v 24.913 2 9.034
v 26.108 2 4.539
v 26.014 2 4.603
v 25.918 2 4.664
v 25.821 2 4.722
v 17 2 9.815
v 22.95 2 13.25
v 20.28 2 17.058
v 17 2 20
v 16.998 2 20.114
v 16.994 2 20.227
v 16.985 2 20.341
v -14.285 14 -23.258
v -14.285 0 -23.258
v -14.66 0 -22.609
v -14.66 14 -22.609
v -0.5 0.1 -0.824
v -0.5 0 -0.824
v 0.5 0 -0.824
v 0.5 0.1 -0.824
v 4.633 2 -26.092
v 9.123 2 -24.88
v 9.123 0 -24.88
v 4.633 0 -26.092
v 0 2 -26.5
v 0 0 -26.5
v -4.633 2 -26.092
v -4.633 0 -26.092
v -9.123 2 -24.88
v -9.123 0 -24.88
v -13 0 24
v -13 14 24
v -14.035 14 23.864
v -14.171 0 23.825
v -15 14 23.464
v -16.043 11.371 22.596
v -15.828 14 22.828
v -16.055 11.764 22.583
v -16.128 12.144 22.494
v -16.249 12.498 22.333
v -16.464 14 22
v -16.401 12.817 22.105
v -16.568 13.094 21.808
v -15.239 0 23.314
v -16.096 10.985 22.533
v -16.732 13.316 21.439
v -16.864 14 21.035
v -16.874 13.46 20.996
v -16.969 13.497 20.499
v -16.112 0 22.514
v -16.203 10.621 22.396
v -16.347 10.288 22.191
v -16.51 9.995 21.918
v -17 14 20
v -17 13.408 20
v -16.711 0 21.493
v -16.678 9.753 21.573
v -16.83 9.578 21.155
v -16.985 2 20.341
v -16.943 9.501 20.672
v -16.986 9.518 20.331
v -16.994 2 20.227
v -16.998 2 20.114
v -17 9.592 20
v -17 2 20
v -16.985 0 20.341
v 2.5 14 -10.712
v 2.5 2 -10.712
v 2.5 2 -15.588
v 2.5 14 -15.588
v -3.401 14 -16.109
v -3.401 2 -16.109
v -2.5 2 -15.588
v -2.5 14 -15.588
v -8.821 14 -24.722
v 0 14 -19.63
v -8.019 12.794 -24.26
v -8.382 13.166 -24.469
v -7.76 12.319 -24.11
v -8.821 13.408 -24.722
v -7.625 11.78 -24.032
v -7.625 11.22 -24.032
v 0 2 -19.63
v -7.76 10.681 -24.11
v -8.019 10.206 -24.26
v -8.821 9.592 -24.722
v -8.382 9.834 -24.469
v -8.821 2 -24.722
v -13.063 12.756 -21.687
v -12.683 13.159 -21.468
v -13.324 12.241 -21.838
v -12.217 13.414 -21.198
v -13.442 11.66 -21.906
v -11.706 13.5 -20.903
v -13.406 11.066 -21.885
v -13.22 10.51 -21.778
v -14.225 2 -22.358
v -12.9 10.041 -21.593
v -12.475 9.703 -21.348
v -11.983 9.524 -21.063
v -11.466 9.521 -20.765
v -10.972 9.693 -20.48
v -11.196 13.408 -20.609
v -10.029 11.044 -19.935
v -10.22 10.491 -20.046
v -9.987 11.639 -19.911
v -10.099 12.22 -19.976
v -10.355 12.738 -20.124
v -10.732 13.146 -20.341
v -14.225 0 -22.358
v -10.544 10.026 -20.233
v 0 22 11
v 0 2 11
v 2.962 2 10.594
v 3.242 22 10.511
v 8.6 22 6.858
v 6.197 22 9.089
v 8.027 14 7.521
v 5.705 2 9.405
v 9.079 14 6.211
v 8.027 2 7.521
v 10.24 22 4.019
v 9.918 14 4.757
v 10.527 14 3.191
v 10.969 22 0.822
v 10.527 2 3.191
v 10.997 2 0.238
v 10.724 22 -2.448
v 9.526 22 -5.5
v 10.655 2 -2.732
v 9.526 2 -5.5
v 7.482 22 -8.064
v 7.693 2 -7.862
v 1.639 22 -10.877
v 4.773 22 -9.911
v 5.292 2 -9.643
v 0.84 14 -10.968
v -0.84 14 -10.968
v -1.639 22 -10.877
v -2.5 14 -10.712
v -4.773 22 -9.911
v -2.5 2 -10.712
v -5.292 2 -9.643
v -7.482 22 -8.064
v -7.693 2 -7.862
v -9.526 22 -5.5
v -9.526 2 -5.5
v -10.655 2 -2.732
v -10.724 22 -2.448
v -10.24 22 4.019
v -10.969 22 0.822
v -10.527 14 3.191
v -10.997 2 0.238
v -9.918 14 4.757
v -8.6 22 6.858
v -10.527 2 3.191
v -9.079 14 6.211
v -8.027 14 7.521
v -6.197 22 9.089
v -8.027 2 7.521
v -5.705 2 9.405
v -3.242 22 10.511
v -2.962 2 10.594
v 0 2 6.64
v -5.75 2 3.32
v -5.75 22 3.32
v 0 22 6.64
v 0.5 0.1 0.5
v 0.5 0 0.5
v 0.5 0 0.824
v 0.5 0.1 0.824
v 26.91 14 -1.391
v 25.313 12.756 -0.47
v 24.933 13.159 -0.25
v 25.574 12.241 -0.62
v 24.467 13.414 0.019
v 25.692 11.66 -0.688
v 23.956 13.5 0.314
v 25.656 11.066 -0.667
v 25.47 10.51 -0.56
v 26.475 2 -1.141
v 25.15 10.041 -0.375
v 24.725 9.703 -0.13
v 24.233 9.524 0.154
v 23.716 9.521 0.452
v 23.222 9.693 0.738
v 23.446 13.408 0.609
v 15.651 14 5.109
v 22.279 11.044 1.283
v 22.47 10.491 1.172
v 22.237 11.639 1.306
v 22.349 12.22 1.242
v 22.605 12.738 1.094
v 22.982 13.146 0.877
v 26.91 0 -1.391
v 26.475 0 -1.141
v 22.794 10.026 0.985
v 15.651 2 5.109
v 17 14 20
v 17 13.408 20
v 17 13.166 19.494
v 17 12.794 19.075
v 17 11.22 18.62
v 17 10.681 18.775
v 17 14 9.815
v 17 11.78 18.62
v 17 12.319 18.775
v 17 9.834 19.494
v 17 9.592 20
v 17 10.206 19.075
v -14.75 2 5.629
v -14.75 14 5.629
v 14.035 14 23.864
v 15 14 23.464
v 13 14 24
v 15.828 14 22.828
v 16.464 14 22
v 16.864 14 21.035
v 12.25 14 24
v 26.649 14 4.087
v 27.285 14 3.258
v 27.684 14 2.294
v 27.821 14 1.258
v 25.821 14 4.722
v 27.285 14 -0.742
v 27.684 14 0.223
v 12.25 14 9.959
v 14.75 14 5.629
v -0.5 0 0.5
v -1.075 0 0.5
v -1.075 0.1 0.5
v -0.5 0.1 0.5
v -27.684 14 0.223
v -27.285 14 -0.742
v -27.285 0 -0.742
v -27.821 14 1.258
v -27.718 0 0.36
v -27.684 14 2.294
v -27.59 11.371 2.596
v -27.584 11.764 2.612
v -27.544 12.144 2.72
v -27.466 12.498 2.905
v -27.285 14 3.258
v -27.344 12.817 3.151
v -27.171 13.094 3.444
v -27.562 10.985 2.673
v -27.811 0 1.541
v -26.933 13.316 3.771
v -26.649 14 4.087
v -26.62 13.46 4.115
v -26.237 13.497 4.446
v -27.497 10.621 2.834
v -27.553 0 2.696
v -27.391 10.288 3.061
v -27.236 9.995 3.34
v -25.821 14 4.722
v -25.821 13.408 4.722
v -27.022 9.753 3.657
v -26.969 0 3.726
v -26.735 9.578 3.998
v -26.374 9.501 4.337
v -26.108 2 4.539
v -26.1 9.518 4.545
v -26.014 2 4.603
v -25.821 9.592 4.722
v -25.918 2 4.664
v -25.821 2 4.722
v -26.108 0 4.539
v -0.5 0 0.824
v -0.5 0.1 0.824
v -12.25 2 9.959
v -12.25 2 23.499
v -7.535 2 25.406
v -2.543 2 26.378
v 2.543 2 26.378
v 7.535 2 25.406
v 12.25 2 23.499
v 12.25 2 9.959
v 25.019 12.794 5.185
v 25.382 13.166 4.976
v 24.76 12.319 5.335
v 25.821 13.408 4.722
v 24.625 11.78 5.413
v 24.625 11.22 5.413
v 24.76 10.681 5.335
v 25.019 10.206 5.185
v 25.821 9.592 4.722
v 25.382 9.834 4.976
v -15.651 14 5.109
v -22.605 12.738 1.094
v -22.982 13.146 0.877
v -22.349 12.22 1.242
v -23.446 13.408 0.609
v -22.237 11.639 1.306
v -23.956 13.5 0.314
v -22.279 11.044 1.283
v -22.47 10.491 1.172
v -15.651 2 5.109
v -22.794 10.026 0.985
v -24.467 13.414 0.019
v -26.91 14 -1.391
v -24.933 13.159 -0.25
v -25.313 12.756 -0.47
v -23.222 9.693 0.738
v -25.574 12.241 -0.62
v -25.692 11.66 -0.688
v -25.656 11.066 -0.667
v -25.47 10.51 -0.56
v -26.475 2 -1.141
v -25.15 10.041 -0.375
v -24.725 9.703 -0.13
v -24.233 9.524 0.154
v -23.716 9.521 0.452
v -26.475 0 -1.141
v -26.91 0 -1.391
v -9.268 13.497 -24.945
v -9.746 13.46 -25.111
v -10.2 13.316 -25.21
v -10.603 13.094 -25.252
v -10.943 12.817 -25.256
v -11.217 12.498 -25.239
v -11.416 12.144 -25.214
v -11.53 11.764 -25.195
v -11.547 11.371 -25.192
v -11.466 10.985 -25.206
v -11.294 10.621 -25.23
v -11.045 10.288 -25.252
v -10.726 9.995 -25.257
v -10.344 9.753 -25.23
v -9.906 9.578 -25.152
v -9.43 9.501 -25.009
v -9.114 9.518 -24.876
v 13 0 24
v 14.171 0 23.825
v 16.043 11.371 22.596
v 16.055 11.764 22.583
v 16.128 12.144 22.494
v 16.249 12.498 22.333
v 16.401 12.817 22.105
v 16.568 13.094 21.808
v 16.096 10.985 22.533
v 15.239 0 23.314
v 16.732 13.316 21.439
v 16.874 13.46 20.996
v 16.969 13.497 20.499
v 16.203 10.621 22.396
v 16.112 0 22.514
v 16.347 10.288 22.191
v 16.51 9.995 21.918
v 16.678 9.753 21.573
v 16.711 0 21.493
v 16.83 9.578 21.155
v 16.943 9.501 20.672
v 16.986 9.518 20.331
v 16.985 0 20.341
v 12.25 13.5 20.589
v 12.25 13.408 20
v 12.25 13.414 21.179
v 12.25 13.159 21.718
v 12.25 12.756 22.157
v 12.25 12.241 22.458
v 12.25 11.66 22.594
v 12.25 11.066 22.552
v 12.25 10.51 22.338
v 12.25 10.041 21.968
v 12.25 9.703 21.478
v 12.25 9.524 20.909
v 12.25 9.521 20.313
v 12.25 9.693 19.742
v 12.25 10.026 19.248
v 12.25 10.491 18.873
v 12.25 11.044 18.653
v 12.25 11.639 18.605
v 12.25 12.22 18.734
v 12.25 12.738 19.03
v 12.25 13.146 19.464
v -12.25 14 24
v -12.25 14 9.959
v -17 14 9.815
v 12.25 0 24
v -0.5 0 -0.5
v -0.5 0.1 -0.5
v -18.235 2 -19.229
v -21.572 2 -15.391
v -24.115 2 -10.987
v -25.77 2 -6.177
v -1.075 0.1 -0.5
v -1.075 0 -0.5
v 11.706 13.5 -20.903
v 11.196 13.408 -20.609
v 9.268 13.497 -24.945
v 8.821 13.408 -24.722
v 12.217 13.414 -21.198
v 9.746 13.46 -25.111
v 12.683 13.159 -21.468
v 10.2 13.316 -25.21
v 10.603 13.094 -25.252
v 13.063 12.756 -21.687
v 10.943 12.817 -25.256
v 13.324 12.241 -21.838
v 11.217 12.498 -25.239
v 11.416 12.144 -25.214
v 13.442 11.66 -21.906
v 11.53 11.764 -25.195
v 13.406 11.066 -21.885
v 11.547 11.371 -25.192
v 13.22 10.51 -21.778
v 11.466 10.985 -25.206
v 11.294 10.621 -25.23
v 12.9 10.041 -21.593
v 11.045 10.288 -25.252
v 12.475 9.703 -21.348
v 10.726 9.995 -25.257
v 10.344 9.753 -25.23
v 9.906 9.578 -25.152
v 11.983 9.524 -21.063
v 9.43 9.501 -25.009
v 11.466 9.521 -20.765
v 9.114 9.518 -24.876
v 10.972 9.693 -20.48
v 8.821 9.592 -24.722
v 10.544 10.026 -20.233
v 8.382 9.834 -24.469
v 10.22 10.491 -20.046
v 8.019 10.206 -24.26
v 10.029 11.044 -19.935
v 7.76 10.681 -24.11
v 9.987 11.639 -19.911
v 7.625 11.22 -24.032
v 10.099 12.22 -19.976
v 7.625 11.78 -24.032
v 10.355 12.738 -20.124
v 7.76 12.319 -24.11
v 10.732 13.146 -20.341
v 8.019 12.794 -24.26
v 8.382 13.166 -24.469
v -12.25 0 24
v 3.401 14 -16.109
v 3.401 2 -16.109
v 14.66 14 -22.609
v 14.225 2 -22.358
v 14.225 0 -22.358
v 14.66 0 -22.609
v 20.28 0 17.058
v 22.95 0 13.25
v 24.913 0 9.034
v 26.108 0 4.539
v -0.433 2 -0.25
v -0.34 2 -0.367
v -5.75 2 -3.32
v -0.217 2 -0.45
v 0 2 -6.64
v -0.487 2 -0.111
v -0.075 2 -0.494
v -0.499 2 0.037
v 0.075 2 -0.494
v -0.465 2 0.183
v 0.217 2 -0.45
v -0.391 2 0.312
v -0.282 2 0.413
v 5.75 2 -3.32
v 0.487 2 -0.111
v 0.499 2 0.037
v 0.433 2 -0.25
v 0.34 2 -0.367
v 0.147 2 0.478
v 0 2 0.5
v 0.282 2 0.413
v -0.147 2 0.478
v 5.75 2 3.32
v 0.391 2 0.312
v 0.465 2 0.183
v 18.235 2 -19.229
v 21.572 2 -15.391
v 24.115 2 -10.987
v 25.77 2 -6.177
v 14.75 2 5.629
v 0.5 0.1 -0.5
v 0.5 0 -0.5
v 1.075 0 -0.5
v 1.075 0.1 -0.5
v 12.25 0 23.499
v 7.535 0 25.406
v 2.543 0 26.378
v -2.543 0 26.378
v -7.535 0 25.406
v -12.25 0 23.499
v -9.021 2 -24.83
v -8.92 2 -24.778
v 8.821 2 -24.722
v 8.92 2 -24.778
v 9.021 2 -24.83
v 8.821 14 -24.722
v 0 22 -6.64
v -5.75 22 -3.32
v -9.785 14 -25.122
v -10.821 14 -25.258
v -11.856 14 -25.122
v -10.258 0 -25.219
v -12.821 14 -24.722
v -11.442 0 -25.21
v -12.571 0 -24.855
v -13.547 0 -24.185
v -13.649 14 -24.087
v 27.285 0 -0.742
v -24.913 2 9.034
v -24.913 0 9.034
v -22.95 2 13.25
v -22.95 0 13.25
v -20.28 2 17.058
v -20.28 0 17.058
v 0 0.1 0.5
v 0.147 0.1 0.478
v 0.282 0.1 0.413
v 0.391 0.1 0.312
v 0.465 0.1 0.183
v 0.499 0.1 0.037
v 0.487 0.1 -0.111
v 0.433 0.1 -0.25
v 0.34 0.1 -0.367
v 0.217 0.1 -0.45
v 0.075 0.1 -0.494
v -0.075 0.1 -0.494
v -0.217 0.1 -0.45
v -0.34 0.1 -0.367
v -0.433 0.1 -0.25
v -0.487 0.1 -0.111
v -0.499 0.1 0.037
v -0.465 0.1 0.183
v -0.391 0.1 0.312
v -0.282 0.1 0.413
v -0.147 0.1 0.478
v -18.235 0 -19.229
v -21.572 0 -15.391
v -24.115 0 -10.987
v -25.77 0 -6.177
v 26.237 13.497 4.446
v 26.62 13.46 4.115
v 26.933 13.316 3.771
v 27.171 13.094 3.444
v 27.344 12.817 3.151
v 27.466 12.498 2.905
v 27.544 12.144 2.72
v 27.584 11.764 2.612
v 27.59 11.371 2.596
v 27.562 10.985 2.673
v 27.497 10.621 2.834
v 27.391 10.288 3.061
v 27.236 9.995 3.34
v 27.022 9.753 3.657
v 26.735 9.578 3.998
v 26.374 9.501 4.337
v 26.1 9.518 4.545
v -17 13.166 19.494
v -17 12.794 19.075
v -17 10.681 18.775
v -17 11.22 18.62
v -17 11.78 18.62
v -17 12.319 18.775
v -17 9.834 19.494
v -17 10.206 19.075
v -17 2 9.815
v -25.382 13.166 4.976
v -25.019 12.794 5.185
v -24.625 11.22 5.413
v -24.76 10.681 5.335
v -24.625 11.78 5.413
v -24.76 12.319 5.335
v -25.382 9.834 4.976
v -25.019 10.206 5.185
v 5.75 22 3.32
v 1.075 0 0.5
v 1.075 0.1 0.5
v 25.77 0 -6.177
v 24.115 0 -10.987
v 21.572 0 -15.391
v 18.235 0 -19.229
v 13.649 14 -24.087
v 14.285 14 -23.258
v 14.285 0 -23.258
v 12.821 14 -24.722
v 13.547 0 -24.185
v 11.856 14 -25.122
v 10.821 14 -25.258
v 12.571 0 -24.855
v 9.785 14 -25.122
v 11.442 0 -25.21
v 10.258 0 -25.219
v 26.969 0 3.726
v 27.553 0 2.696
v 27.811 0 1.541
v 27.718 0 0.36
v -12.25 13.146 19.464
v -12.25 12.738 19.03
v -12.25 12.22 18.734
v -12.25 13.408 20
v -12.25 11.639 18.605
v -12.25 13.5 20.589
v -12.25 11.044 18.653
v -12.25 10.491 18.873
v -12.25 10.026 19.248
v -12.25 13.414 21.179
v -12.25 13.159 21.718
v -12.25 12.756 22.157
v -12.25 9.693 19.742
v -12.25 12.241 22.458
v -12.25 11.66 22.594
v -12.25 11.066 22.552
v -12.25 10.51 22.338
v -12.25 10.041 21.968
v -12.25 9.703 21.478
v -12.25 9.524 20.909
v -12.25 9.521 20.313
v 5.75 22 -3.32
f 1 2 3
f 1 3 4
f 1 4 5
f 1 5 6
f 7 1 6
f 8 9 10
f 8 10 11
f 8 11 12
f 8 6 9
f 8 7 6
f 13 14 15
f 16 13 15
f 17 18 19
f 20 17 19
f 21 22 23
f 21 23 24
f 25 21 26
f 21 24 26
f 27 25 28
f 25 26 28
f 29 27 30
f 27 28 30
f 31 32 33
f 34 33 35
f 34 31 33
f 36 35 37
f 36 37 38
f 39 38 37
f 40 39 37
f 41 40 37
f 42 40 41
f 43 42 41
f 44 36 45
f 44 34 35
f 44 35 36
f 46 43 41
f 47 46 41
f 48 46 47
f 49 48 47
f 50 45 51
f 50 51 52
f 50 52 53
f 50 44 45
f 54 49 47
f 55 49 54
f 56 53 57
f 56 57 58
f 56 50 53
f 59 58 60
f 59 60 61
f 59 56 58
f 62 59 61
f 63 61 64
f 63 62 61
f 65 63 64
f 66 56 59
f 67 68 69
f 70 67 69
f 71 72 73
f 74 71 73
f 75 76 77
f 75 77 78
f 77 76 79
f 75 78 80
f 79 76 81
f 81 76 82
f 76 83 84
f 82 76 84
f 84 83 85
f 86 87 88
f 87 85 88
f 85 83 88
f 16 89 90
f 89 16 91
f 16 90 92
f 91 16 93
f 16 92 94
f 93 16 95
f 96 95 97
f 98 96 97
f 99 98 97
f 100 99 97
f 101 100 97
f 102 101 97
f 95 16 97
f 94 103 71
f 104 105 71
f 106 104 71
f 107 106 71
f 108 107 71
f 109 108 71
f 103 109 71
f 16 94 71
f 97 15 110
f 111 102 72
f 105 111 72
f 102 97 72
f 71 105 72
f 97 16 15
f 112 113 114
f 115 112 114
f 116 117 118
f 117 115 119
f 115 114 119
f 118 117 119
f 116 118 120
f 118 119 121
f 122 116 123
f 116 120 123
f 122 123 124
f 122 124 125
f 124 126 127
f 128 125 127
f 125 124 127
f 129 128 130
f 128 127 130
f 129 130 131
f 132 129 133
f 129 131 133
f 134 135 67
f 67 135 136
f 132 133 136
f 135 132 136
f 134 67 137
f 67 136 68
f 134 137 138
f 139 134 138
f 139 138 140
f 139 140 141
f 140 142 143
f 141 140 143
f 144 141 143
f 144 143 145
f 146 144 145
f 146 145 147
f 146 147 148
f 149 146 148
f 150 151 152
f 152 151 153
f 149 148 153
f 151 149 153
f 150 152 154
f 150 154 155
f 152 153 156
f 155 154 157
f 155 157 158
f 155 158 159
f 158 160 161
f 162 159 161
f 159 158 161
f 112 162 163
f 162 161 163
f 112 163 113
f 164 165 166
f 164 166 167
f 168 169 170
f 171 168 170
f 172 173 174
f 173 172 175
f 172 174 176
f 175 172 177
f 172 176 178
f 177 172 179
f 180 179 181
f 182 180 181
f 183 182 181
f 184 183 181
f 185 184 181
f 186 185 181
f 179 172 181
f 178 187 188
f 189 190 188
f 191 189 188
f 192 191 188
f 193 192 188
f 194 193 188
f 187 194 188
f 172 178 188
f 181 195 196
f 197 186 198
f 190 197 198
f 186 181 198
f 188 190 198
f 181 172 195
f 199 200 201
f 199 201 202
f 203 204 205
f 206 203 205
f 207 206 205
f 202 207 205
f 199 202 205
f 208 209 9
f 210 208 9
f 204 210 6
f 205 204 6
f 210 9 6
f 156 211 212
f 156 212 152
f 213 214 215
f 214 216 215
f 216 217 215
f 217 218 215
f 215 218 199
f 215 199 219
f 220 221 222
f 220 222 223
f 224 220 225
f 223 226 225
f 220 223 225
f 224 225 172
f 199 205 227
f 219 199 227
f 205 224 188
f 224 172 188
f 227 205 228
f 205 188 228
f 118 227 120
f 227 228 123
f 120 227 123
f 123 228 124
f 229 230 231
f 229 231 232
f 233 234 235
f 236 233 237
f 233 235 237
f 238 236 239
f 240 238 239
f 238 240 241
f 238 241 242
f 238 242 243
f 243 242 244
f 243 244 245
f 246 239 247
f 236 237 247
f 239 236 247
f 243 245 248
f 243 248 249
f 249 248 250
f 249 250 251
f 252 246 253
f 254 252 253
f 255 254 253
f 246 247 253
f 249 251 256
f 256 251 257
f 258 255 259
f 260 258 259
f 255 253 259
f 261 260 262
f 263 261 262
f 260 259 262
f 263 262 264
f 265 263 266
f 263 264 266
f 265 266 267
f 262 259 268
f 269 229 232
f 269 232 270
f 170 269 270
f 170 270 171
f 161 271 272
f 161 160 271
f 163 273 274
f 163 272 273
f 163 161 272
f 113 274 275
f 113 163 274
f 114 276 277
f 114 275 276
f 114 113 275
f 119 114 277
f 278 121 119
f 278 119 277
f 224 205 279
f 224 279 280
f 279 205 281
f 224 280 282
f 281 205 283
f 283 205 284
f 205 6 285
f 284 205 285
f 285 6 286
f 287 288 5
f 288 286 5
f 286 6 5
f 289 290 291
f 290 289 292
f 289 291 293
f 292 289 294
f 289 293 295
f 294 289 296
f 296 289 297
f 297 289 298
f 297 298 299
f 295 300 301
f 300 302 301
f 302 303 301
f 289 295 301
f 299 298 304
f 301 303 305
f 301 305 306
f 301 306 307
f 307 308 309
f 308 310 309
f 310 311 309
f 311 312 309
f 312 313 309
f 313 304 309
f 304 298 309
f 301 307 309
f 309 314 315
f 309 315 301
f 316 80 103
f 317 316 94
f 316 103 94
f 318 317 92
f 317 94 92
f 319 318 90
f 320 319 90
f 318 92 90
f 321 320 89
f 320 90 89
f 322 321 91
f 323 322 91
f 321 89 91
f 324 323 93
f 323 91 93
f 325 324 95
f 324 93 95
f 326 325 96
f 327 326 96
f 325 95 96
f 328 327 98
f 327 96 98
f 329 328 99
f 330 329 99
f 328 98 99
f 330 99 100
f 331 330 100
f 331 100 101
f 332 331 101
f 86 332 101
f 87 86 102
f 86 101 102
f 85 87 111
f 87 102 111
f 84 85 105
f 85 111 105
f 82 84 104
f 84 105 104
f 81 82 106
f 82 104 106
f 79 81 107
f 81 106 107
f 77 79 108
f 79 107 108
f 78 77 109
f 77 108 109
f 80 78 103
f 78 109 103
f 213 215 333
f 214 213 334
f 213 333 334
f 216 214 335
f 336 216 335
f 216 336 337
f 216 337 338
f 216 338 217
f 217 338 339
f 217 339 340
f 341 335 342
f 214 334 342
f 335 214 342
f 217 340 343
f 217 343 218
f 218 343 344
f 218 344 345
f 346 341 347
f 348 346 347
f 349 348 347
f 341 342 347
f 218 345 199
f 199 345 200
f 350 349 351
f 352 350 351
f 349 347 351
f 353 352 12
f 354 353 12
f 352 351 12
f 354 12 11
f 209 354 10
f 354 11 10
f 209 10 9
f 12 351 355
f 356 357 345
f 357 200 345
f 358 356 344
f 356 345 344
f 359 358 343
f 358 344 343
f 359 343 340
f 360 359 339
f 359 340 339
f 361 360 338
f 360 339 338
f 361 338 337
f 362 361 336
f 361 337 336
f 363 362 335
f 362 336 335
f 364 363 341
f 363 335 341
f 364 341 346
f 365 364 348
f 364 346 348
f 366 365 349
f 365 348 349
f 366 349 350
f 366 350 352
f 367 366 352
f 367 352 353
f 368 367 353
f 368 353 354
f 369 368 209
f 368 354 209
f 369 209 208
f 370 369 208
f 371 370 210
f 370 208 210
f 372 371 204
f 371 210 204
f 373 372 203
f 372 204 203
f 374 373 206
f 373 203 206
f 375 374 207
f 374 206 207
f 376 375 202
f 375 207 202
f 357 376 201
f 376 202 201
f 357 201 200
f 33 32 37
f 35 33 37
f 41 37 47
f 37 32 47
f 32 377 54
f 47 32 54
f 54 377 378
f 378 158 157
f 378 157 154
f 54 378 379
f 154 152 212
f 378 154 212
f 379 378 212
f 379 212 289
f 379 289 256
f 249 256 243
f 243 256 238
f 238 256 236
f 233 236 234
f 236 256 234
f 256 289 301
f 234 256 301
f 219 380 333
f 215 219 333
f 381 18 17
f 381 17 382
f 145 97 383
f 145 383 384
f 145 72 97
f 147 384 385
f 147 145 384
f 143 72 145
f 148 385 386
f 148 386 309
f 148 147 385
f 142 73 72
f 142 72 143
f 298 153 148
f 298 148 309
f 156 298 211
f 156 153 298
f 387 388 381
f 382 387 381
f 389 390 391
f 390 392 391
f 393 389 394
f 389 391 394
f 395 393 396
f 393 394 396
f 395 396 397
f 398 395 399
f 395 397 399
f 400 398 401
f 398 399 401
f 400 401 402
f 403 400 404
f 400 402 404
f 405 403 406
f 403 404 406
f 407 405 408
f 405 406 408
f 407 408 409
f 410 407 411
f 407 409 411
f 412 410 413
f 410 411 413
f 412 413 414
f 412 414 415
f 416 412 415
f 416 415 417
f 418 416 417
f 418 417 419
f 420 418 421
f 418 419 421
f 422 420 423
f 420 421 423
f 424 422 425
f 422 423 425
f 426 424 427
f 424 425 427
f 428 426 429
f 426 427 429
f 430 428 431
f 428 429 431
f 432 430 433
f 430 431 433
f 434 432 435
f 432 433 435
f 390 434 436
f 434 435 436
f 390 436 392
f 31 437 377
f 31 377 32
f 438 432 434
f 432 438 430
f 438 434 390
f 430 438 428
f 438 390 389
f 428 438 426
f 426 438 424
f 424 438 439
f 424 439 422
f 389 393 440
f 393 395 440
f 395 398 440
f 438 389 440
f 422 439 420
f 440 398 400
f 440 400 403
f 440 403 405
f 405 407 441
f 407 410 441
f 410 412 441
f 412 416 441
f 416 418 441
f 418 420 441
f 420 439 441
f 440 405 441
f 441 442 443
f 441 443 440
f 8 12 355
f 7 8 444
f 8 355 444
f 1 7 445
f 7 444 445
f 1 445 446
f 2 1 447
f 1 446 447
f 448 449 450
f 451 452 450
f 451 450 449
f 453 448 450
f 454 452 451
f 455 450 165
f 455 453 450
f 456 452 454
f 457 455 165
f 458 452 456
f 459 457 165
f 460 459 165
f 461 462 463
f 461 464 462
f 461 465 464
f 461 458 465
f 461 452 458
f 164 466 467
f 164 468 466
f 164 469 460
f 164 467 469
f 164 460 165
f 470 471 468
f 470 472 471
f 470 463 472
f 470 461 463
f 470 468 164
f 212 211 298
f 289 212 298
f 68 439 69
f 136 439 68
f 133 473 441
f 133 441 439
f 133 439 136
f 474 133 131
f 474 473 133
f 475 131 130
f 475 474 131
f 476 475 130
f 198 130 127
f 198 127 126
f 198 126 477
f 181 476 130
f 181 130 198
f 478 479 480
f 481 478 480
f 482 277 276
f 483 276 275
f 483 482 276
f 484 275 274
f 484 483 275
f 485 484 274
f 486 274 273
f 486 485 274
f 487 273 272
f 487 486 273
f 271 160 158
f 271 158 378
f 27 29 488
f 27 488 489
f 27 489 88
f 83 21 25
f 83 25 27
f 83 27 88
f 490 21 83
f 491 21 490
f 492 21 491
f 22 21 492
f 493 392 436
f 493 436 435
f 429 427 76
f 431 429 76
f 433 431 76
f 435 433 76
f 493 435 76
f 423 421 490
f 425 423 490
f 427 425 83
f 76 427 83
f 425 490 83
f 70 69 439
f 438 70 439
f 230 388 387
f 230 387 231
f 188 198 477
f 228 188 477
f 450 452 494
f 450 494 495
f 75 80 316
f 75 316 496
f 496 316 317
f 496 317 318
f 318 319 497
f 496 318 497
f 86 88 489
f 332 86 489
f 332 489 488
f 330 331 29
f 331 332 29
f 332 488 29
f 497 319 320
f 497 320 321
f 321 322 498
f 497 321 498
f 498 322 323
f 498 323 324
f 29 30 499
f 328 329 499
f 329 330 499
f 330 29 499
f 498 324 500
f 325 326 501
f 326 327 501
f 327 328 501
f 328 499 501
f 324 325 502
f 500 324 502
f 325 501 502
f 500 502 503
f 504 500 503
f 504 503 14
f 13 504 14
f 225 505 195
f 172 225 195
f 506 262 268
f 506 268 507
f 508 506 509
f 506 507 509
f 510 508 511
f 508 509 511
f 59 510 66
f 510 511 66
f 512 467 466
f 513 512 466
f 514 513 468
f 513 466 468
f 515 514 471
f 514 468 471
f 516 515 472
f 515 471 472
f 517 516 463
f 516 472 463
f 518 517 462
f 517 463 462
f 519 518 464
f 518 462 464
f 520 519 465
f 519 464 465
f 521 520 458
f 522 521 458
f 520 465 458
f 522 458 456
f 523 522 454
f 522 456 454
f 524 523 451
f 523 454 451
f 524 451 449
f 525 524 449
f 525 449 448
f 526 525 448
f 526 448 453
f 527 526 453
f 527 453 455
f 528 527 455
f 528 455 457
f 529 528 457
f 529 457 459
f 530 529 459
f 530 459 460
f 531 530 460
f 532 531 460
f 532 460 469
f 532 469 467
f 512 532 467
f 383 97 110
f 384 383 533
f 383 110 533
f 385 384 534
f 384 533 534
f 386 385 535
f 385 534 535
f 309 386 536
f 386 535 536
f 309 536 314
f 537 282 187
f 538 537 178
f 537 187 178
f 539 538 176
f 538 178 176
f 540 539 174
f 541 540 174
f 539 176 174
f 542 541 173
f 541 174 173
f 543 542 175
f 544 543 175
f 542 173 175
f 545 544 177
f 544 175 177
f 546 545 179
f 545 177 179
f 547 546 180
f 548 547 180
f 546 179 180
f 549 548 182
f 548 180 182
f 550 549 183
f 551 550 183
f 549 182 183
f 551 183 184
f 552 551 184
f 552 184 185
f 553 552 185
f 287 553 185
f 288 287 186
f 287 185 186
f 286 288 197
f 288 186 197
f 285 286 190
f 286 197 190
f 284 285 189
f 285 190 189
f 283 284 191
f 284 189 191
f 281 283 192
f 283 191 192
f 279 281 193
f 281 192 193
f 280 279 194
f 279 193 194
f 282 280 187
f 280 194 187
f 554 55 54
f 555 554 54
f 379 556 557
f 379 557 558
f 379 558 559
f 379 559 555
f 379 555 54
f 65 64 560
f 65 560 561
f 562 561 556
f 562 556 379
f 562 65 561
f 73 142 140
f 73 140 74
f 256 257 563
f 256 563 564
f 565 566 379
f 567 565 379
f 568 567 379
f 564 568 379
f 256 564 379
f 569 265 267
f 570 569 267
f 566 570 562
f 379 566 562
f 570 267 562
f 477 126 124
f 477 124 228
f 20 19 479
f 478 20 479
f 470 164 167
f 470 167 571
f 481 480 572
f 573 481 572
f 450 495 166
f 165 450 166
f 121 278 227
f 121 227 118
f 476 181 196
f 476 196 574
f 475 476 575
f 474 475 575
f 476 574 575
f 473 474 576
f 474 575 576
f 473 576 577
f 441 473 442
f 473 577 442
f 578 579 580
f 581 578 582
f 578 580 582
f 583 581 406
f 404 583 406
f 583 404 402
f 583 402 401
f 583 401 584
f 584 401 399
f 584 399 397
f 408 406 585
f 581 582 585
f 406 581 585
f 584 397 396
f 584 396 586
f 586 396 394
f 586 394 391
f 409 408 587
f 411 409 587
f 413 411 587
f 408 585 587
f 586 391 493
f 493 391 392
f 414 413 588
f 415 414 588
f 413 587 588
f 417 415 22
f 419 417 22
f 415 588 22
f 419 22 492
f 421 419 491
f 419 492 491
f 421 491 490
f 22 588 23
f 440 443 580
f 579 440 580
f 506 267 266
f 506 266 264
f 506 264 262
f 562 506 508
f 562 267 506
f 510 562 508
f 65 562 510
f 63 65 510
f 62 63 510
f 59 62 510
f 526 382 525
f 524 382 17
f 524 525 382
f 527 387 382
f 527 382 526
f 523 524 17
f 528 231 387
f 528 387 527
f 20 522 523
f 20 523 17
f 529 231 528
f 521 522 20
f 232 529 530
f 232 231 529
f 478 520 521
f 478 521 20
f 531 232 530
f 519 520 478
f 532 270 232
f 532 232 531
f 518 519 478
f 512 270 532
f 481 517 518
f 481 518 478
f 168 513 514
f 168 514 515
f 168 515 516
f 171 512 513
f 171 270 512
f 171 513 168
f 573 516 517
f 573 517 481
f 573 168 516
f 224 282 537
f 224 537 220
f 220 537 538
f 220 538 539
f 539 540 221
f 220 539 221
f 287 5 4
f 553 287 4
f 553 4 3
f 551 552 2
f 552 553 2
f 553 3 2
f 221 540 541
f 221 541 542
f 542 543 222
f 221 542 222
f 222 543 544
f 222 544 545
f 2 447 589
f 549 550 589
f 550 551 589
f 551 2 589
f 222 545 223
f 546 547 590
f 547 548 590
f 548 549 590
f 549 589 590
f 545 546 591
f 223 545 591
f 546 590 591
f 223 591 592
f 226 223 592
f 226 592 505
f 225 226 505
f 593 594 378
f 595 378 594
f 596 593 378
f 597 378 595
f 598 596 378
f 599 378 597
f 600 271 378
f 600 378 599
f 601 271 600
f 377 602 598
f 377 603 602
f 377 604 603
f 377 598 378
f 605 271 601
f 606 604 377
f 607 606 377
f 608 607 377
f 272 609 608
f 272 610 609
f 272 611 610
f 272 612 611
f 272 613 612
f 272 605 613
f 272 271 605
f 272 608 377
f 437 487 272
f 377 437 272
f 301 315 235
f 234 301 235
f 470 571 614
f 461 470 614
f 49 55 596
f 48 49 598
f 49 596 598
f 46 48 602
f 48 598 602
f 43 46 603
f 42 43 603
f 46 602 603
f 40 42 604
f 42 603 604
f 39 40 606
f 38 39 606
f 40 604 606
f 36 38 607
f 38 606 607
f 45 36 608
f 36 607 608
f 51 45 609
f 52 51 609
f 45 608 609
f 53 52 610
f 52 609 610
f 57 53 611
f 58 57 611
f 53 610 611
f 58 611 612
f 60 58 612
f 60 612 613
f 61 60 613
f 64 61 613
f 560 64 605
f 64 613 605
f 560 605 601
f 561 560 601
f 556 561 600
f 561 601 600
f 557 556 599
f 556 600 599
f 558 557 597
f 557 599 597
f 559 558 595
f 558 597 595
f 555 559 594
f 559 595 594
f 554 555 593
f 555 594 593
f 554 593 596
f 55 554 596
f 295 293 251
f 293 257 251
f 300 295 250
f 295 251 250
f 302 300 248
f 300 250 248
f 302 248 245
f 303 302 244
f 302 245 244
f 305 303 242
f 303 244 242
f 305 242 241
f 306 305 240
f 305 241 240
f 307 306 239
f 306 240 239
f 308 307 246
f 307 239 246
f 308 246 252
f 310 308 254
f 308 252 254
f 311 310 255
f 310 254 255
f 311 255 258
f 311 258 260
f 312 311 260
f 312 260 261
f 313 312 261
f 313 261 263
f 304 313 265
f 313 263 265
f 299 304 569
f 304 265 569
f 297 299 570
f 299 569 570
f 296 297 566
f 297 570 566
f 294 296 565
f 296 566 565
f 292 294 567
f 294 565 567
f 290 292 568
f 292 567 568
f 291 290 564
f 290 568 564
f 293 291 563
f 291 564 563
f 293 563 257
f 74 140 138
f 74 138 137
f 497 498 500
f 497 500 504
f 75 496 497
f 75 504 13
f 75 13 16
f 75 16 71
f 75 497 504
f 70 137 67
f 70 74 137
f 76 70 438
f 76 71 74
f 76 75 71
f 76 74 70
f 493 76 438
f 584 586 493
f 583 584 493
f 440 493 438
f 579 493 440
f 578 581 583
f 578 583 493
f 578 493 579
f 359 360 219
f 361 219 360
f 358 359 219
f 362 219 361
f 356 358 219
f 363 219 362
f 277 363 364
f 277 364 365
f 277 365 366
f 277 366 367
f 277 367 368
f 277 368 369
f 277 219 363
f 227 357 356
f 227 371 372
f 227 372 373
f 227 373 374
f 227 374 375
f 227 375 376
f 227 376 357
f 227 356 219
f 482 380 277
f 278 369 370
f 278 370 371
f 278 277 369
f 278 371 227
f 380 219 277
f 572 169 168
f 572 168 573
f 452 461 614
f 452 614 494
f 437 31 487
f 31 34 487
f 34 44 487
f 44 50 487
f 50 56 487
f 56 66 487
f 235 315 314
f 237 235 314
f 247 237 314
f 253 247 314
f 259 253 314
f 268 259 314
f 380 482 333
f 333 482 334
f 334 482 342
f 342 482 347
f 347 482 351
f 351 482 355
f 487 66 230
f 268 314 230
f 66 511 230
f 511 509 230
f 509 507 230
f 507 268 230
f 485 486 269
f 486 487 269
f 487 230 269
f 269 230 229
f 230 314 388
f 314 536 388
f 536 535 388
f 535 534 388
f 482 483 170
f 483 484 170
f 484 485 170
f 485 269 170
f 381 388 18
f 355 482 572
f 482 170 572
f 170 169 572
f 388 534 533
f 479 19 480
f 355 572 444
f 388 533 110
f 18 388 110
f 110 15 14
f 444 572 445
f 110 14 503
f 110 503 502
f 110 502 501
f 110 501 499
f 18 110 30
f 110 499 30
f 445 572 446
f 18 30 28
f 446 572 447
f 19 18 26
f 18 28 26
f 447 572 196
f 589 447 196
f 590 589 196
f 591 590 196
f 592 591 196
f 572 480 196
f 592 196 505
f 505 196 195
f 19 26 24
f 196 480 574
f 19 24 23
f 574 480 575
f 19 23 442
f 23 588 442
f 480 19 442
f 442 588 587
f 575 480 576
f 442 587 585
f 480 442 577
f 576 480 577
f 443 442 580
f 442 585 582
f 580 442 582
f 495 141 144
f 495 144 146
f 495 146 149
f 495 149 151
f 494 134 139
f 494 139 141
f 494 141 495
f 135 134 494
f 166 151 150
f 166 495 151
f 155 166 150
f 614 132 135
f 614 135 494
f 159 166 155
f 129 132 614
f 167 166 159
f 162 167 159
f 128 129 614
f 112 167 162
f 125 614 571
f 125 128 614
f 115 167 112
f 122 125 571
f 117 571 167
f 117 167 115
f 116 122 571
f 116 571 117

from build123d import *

# Parameters (mm, degrees)
SALIENTE_EXTRUIR1_DEPTH      = 2
SALIENTE_EXTRUIR1_DEPTH_BACK = 2
CROQUIS2_R                   = 26.5
SALIENTE_EXTRUIR2_DEPTH      = 22
SALIENTE_EXTRUIR2_DEPTH_BACK = 22
CROQUIS3_R                   = 11
CROQUIS5_W                   = 5
CROQUIS5_H                   = 10.605029608
SALIENTE_EXTRUIR3_DEPTH      = 14
SALIENTE_EXTRUIR5_DEPTH      = 14
CROQUIS7_W                   = 24.5
CROQUIS7_H                   = 19
SALIENTE_EXTRUIR12_DEPTH     = 21
CROQUIS8_R                   = 2
CORTAR_EXTRUIR1_DEPTH        = 37
CROQUIS10_W                  = 24.5
CROQUIS10_H                  = 19
CORTAR_EXTRUIR2_DEPTH        = 19
MATRIZC2_COUNT               = 3
CORTAR_EXTRUIR3_START        = -19
CORTAR_EXTRUIR3_DEPTH        = 19
CORTAR_EXTRUIR5_DEPTH        = 33
CORTAR_EXTRUIR5_DEPTH_BACK   = 33
CROQUIS15_W                  = 59.132564764
CROQUIS15_H                  = 24.236023023
CROQUIS16_R                  = 0.5
CORTAR_EXTRUIR6_DEPTH        = 10
CORTAR_EXTRUIR8_START        = -0.1
CROQUIS17_R                  = 0.5
CORTAR_EXTRUIR8_DEPTH        = 0.1


with BuildPart() as part:
    # Croquis2 → Saliente-Extruir1 (new, two sides: drawn at the far end of the back side and taken through both)
    with BuildSketch(Plane(origin=(0, 0, 0), x_dir=(1, 0, 0), z_dir=(0, 1, 0)).offset(-SALIENTE_EXTRUIR1_DEPTH_BACK)):
        Circle(CROQUIS2_R)
    extrude(amount=SALIENTE_EXTRUIR1_DEPTH + SALIENTE_EXTRUIR1_DEPTH_BACK)

    # Croquis3 → Saliente-Extruir2 (add, two sides: drawn at the far end of the back side and taken through both)
    with BuildSketch(Plane(origin=(0, 0, 0), x_dir=(1, 0, 0), z_dir=(0, 1, 0)).offset(-SALIENTE_EXTRUIR2_DEPTH_BACK)):
        Circle(CROQUIS3_R)
        Polygon((0, 6.639528096), (-5.75, 3.319764048), (-5.75, -3.319764048), (0, -6.639528096), (5.75, -3.319764048), (5.75, 3.319764048), align=None, mode=Mode.SUBTRACT)
    extrude(amount=SALIENTE_EXTRUIR2_DEPTH + SALIENTE_EXTRUIR2_DEPTH_BACK)

    # Croquis5 → Saliente-Extruir3 (add)
    with BuildSketch(Plane(origin=(0, 0, 0), x_dir=(1, 0, 0), z_dir=(0, 1, 0))):
        with Locations((0, 13.697485196)):
            Rectangle(CROQUIS5_W, CROQUIS5_H)
        Polygon((8.520257623, -2.032421687), (17.704482672, -7.334936491), (15.204482672, -11.665063509), (6.020257623, -6.362548705), align=None)
        Polygon((-6.020257623, -6.362548705), (-15.204482672, -11.665063509), (-17.704482672, -7.334936491), (-8.520257623, -2.032421687), align=None)
    extrude(amount=SALIENTE_EXTRUIR3_DEPTH)

    # Croquis6 → Saliente-Extruir5 (add)
    with BuildSketch(Plane(origin=(0, 0, 0), x_dir=(1, 0, 0), z_dir=(0, 1, 0))):
        with BuildLine():
            Line((-12.25, -11), (-12.25, -24))
            Line((-12.25, -24), (-13, -24))
            ThreePointArc((-13, -24), (-15.828427125, -22.828427125), (-17, -20))
            Line((-17, -20), (-17, -9))
            Line((-17, -9), (-12.25, -9))
            Line((-12.25, -9), (-12.25, -11))
        make_face()
        with BuildLine():
            Line((12.25, -11), (12.25, -24))
            Line((12.25, -24), (13, -24))
            ThreePointArc((13, -24), (15.828427125, -22.828427125), (17, -20))
            Line((17, -20), (17, -9))
            Line((17, -9), (12.25, -9))
            Line((12.25, -9), (12.25, -11))
        make_face()
        with BuildLine():
            Line((-1.669228634, 15.108811196), (0.705771366, 19.222431864))
            Line((0.705771366, 19.222431864), (-8.820508076, 24.722431864))
            ThreePointArc((-8.820508076, 24.722431864), (-11.855784256, 25.122033554), (-14.284609691, 23.258330249))
            Line((-14.284609691, 23.258330249), (-14.659609691, 22.608811196))
            Line((-14.659609691, 22.608811196), (-3.401279442, 16.108811196))
            Line((-3.401279442, 16.108811196), (-1.669228634, 15.108811196))
        make_face()
        with BuildLine():
            Line((-15.651279442, -5.108811196), (-26.909609691, 1.391188804))
            Line((-26.909609691, 1.391188804), (-27.284609691, 0.741669751))
            ThreePointArc((-27.284609691, 0.741669751), (-27.684211381, -2.29360643), (-25.820508076, -4.722431864))
            Line((-25.820508076, -4.722431864), (-16.294228634, -10.222431864))
            Line((-16.294228634, -10.222431864), (-13.919228634, -6.108811196))
            Line((-13.919228634, -6.108811196), (-15.651279442, -5.108811196))
        make_face()
        with BuildLine():
            Line((13.919228634, -6.108811196), (16.294228634, -10.222431864))
            Line((16.294228634, -10.222431864), (25.820508076, -4.722431864))
            ThreePointArc((25.820508076, -4.722431864), (27.684211381, -2.29360643), (27.284609691, 0.741669751))
            Line((27.284609691, 0.741669751), (26.909609691, 1.391188804))
            Line((26.909609691, 1.391188804), (15.651279442, -5.108811196))
            Line((15.651279442, -5.108811196), (13.919228634, -6.108811196))
        make_face()
        with BuildLine():
            Line((3.401279442, 16.108811196), (14.659609691, 22.608811196))
            Line((14.659609691, 22.608811196), (14.284609691, 23.258330249))
            ThreePointArc((14.284609691, 23.258330249), (11.855784256, 25.122033554), (8.820508076, 24.722431864))
            Line((8.820508076, 24.722431864), (-0.705771366, 19.222431864))
            Line((-0.705771366, 19.222431864), (1.669228634, 15.108811196))
            Line((1.669228634, 15.108811196), (3.401279442, 16.108811196))
        make_face()
    extrude(amount=SALIENTE_EXTRUIR5_DEPTH)

    # Croquis7 → Saliente-Extruir12 (add)
    with BuildSketch(Plane(origin=(0, 0, 0), x_dir=(1, 0, 0), z_dir=(0, 1, 0))):
        with Locations((0, -20.6)):
            Rectangle(CROQUIS7_W, CROQUIS7_H)
    extrude(amount=SALIENTE_EXTRUIR12_DEPTH)

    # Croquis8 → Cortar-Extruir1 (cut, symmetric)
    with BuildSketch(Plane(origin=(12.25, 0, 0), x_dir=(0, 0, -1), z_dir=(1, 0, 0))):
        with Locations((-20.6, 11.5)):
            Circle(CROQUIS8_R)
    cortar_extruir1 = extrude(amount=CORTAR_EXTRUIR1_DEPTH, both=True, mode=Mode.SUBTRACT)

    # Croquis10 → Cortar-Extruir2 (cut)
    with BuildSketch(Plane(origin=(0, 21, 0), x_dir=(1, 0, 0), z_dir=(0, 1, 0))):
        with Locations((0, -20.6)):
            Rectangle(CROQUIS10_W, CROQUIS10_H)
    extrude(amount=-CORTAR_EXTRUIR2_DEPTH, mode=Mode.SUBTRACT)

    # MatrizC2: Cortar-Extruir1 ×3 about axis
    matrizc2_axis = Axis((0, -24.2, 0), (0, 1, 0))
    for i in range(1, MATRIZC2_COUNT):
        add(cortar_extruir1.rotate(matrizc2_axis, i * 360 / MATRIZC2_COUNT), mode=Mode.SUBTRACT)

    # Croquis14 → Cortar-Extruir3 (cut)
    with BuildSketch(Plane(origin=(0, 2, 0), x_dir=(1, 0, 0), z_dir=(0, 1, 0)).offset(CORTAR_EXTRUIR3_START)):
        with BuildLine():
            Line((-12.25, -24), (-12.25, -30.1))
            Line((-12.25, -30.1), (12.25, -30.1))
            Line((12.25, -30.1), (12.25, -24))
            Line((12.25, -24), (12.25, -23.498670175))
            ThreePointArc((12.25, -23.498670175), (0, -26.5), (-12.25, -23.498670175))
            Line((-12.25, -23.498670175), (-12.25, -24))
        make_face()
    extrude(amount=CORTAR_EXTRUIR3_DEPTH, mode=Mode.SUBTRACT)

    # Croquis15 → Cortar-Extruir5 (cut, two sides: drawn at the far end of the back side and taken through both)
    with BuildSketch(Plane.XY.offset(-CORTAR_EXTRUIR5_DEPTH_BACK)):
        with Locations((-0.66628242, -12.118011512)):
            Rectangle(CROQUIS15_W, CROQUIS15_H)
    extrude(amount=CORTAR_EXTRUIR5_DEPTH + CORTAR_EXTRUIR5_DEPTH_BACK, mode=Mode.SUBTRACT)

    # Croquis16 → Cortar-Extruir6 (cut)
    with BuildSketch(Plane(origin=(0, 2, 0), x_dir=(1, 0, 0), z_dir=(0, 1, 0))):
        Circle(CROQUIS16_R)
    extrude(amount=-CORTAR_EXTRUIR6_DEPTH, mode=Mode.SUBTRACT)

    # Croquis17 → Cortar-Extruir8 (cut)
    with BuildSketch(Plane.XZ.offset(CORTAR_EXTRUIR8_START)):
        Polygon((-1.075157711, 0.5), (-1.075157711, -0.5), (-0.5, -0.5), (-0.5, -0.823598898), (0.5, -0.823598898), (0.5, -0.5), (1.075157711, -0.5), (1.075157711, 0.5), (0.5, 0.5), (0.5, 0.823598898), (-0.5, 0.823598898), (-0.5, 0.5), align=None)
        Circle(CROQUIS17_R, mode=Mode.SUBTRACT)
    extrude(amount=CORTAR_EXTRUIR8_DEPTH, mode=Mode.SUBTRACT)


solid = part.part
